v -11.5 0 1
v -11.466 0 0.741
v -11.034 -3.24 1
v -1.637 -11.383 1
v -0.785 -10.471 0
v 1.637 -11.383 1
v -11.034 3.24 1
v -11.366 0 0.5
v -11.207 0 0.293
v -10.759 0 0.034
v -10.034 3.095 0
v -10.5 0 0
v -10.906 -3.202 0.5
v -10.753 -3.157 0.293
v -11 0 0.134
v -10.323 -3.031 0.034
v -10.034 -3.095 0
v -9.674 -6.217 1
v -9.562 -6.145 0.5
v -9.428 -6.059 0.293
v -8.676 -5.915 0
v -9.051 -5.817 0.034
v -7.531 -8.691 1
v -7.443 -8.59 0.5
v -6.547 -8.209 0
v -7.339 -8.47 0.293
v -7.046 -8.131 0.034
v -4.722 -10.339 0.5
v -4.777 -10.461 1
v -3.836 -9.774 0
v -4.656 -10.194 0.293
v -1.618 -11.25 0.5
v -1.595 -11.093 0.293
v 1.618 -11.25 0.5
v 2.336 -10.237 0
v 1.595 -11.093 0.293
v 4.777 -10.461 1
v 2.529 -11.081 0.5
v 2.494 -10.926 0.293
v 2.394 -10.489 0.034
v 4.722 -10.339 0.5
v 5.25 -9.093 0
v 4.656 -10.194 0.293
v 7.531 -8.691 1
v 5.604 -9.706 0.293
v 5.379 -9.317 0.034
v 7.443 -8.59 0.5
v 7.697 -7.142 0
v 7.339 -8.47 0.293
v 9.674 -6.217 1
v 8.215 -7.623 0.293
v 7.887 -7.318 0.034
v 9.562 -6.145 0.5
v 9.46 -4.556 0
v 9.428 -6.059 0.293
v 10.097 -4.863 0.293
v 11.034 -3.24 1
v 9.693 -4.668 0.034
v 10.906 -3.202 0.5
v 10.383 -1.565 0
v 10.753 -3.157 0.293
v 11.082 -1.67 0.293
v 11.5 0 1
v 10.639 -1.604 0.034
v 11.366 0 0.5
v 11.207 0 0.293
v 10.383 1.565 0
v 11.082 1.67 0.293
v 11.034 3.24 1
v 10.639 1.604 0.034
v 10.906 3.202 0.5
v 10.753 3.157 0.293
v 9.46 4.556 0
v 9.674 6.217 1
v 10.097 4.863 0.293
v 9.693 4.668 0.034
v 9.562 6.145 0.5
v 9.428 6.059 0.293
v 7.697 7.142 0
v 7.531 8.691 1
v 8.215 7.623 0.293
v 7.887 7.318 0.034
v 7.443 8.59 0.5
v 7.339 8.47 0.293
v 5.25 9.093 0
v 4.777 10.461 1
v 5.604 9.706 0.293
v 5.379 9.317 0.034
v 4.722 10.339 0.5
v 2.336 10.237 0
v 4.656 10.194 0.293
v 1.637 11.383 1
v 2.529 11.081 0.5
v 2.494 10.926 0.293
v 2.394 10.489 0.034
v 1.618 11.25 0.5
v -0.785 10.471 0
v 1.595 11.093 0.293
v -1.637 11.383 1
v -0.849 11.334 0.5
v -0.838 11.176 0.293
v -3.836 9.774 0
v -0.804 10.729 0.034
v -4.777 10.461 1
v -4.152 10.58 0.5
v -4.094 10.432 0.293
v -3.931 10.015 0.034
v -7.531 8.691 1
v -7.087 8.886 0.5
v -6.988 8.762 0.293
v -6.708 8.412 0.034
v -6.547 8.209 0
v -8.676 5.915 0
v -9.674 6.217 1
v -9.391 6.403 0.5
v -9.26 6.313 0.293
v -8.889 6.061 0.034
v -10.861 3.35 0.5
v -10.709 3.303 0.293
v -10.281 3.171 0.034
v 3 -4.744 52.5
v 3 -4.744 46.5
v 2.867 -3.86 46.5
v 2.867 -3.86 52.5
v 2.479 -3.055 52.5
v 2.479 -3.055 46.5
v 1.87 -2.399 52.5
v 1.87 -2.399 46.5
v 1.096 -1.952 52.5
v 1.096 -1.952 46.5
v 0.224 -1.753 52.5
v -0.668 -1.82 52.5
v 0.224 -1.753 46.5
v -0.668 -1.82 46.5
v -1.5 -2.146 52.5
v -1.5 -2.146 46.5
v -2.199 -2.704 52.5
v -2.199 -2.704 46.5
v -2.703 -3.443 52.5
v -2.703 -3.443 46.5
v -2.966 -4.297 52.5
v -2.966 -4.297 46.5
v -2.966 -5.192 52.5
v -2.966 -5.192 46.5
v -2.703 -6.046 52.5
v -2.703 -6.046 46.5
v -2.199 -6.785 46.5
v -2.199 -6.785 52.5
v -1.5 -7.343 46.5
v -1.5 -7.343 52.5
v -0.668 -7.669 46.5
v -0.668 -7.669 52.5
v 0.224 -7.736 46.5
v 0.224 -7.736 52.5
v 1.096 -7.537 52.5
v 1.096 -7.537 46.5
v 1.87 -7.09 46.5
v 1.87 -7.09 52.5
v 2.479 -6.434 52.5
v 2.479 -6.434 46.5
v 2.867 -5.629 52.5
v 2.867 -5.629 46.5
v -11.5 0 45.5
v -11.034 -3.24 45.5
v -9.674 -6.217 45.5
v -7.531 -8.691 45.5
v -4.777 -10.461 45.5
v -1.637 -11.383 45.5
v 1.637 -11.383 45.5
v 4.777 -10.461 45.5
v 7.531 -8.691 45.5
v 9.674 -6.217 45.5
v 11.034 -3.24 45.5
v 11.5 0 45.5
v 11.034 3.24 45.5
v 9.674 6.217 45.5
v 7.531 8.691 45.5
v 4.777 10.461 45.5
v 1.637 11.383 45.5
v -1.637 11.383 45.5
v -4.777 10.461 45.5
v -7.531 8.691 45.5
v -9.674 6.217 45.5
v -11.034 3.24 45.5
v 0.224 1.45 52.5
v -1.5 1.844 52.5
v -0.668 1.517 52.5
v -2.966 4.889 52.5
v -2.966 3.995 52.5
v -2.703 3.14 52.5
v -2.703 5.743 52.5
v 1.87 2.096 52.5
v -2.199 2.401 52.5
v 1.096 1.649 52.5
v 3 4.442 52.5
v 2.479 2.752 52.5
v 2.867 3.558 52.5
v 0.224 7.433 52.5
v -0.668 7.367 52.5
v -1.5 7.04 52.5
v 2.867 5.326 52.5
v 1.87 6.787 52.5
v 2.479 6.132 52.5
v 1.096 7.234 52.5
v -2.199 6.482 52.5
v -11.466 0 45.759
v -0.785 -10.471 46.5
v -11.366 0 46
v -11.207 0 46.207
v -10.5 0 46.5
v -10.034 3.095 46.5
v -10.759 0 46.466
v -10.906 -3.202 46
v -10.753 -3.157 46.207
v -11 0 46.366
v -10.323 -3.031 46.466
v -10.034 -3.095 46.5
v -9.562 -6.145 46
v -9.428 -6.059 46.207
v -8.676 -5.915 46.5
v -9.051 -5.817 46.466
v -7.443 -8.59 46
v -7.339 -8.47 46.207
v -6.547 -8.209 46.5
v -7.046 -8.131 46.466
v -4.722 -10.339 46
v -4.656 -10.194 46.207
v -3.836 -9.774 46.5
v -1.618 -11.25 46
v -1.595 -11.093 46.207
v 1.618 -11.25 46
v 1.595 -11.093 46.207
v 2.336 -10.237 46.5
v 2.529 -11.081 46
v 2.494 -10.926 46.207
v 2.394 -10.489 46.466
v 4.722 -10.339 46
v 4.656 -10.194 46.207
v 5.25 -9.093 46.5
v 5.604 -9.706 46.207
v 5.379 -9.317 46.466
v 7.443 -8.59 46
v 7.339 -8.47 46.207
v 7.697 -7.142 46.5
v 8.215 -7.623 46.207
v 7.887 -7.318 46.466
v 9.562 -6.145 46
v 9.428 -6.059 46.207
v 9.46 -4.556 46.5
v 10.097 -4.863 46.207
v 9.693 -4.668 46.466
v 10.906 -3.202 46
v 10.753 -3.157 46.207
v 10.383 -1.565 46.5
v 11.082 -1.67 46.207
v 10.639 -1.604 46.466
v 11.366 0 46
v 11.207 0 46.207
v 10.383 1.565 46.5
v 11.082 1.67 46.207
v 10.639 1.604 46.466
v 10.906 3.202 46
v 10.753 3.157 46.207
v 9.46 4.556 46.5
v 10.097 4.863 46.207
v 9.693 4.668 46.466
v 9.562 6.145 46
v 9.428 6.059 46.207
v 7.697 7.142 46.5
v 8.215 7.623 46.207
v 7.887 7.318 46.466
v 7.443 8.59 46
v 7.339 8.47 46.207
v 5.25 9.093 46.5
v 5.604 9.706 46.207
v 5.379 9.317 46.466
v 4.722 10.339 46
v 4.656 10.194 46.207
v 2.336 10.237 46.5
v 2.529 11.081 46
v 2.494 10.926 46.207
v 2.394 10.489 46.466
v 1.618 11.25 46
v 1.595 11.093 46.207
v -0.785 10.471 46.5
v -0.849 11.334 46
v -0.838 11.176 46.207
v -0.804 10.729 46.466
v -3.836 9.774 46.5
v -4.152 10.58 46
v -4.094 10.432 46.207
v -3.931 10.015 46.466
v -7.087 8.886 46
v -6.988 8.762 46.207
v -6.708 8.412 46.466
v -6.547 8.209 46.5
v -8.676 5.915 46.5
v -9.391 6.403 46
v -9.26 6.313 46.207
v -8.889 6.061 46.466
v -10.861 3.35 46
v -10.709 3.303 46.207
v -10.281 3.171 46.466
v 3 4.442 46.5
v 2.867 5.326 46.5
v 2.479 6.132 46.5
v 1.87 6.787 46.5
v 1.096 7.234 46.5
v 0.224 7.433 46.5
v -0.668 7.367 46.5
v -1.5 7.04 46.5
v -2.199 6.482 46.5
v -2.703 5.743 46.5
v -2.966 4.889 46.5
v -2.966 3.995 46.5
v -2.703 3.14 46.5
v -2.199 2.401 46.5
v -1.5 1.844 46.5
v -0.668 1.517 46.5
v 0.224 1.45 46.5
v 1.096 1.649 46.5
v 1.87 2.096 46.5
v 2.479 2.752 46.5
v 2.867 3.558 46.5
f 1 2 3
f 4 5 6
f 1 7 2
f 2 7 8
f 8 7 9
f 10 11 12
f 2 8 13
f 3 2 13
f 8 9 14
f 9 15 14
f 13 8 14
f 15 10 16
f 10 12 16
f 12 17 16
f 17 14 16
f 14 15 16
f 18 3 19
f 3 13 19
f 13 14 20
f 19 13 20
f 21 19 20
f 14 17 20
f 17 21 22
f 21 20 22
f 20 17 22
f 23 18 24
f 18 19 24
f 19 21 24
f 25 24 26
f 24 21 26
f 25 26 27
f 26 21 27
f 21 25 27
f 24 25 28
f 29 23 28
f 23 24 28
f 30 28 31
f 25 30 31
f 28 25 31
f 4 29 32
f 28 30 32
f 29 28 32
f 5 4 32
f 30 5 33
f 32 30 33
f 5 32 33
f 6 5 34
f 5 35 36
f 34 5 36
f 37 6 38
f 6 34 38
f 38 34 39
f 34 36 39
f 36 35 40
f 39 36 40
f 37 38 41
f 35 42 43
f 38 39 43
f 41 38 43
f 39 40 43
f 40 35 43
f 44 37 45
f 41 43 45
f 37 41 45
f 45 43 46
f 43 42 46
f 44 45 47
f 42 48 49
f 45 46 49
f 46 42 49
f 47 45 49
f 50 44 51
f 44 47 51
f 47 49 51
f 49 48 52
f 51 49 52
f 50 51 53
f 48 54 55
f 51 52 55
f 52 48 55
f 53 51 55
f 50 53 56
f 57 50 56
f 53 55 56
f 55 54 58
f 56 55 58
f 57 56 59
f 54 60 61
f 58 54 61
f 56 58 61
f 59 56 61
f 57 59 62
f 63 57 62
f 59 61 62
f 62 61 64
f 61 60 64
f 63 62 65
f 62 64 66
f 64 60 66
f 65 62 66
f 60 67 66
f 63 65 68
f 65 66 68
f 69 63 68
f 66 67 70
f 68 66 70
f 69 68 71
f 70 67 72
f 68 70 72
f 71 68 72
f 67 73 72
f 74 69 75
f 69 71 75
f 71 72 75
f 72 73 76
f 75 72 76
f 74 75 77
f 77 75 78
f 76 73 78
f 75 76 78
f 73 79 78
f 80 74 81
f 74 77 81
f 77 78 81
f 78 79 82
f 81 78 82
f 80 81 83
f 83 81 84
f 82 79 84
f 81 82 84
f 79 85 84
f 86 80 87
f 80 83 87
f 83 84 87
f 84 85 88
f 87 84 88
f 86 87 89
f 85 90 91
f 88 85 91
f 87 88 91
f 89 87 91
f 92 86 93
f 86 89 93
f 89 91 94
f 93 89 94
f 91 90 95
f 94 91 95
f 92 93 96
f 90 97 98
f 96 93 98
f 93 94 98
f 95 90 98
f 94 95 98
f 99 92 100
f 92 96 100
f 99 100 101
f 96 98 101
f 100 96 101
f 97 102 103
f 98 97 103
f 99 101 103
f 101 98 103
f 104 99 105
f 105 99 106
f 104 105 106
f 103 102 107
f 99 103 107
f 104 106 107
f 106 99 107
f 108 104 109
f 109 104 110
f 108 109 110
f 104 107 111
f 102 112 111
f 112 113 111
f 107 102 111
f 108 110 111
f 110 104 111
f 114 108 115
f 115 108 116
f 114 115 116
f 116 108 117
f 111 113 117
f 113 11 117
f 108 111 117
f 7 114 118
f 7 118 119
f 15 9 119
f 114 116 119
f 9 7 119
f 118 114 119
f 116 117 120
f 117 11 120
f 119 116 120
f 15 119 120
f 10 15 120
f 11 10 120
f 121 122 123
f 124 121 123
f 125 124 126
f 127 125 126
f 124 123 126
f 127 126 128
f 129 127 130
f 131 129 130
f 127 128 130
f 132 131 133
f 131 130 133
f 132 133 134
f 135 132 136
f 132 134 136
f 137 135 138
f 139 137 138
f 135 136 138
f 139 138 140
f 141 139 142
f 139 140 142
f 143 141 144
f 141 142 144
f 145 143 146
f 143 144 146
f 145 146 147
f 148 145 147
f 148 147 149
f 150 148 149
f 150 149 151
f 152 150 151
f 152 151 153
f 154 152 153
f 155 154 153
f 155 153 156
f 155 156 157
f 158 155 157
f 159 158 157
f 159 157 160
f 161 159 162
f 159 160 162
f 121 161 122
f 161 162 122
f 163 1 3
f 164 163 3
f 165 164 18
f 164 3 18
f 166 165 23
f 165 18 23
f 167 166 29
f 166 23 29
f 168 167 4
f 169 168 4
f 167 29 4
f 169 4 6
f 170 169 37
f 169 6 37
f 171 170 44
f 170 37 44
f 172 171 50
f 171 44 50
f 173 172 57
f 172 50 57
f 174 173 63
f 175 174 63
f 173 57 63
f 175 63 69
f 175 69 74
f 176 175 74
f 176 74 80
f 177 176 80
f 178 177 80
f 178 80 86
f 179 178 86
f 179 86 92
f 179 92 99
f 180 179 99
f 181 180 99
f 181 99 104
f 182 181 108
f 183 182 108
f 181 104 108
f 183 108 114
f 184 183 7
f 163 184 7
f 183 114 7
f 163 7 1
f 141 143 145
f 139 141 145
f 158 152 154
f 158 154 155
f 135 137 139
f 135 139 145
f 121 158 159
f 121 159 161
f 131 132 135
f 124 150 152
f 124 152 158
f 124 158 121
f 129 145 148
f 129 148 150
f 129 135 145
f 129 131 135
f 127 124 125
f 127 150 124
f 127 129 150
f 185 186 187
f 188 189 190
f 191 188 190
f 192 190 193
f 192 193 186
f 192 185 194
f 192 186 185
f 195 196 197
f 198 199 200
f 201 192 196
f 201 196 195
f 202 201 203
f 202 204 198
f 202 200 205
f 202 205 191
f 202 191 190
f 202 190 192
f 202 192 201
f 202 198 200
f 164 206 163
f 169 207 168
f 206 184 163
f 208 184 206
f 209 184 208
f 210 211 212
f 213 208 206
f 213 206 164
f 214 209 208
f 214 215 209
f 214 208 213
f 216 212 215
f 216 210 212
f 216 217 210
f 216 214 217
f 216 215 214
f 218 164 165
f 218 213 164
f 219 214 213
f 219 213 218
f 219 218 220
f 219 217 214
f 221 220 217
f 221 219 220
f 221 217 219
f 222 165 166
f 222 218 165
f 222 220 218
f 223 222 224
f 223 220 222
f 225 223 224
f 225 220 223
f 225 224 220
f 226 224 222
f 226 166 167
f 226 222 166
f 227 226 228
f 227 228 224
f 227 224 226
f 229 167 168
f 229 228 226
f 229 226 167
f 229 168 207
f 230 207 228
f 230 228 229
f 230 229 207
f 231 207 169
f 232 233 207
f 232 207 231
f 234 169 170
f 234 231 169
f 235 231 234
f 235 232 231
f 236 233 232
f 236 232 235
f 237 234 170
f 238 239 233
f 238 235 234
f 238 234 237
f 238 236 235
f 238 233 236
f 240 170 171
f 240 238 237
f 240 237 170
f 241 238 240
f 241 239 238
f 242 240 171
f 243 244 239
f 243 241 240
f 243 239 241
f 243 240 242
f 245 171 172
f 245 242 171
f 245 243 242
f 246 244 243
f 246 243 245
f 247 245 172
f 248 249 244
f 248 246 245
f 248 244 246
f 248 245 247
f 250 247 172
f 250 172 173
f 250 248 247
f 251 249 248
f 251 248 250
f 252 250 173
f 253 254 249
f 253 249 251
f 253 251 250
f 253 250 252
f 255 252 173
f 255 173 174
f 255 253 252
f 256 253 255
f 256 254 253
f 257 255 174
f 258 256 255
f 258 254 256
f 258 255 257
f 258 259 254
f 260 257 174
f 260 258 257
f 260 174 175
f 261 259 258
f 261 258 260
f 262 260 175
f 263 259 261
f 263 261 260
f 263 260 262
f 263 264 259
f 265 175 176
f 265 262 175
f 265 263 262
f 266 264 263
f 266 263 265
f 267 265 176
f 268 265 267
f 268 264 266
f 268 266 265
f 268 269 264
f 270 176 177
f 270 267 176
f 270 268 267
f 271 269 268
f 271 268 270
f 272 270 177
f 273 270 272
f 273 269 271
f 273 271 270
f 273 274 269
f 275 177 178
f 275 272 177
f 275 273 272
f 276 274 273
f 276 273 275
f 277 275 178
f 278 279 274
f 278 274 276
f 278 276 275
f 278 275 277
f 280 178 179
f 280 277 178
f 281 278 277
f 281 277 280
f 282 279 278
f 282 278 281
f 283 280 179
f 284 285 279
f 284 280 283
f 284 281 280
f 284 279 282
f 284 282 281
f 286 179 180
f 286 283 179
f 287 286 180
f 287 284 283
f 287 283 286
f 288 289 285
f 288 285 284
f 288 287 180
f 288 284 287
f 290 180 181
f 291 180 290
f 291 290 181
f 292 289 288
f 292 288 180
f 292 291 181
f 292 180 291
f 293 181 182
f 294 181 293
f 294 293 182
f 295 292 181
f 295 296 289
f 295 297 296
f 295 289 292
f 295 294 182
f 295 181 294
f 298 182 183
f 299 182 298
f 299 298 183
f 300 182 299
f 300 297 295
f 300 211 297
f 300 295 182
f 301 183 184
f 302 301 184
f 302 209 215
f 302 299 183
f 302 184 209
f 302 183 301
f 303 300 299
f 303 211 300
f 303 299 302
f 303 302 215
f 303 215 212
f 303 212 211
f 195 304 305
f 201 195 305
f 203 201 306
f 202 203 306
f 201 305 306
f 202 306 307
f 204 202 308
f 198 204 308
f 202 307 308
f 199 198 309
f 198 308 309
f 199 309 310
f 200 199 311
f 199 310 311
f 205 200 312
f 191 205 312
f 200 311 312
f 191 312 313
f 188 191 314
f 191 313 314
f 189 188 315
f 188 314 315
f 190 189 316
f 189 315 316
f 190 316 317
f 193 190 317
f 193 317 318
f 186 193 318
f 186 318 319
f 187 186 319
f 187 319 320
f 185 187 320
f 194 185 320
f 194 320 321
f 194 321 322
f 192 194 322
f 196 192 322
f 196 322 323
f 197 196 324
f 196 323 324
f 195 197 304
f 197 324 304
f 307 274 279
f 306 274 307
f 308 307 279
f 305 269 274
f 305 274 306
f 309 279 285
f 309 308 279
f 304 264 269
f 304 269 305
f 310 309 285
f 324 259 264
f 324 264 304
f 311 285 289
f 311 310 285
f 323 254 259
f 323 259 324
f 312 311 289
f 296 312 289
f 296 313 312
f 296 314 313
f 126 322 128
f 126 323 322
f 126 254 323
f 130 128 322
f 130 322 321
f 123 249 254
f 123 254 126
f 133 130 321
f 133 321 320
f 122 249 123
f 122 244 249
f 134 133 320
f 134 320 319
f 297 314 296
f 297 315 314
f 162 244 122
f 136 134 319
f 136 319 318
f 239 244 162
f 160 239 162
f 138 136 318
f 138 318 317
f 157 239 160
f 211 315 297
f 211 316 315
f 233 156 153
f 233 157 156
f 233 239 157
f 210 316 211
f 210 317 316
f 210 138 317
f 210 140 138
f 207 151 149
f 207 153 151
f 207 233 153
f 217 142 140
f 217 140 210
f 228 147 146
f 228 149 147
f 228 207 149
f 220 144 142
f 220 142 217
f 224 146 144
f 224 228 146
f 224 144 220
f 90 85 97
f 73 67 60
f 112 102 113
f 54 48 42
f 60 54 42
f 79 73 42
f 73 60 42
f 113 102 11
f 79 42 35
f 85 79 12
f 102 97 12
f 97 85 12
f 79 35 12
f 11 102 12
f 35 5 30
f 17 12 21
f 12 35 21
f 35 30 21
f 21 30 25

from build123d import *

# Parameters (mm, degrees)
SKETCH1_R           = 11.5
BOSS_EXTRUDE1_DEPTH = 46.5
FILLET1_R           = 1
SKETCH2_R           = 3
BOSS_EXTRUDE2_DEPTH = 6


with BuildPart() as part:
    # Sketch1 → Boss-Extrude1 (new body)
    with BuildSketch(Plane.XY):
        with Locations(Location((0, 0, 0), (0, 0, 180))):
            Circle(SKETCH1_R)
    extrude(amount=BOSS_EXTRUDE1_DEPTH)

    # Fillet1
    fillet1_edges = [part.edges().sort_by_distance(p)[0] for p in [
        (11.5, 0, 0),
        (11.5, 0, 46.5),
    ]]
    fillet(fillet1_edges, radius=FILLET1_R)

    # Sketch2 → Boss-Extrude2 (add)
    with BuildSketch(Plane.XY.offset(46.5)):
        with Locations((0, -4.744469282)):
            Circle(SKETCH2_R)
        with Locations((0, 4.441817119)):
            Circle(SKETCH2_R)
    extrude(amount=BOSS_EXTRUDE2_DEPTH)


solid = part.part
